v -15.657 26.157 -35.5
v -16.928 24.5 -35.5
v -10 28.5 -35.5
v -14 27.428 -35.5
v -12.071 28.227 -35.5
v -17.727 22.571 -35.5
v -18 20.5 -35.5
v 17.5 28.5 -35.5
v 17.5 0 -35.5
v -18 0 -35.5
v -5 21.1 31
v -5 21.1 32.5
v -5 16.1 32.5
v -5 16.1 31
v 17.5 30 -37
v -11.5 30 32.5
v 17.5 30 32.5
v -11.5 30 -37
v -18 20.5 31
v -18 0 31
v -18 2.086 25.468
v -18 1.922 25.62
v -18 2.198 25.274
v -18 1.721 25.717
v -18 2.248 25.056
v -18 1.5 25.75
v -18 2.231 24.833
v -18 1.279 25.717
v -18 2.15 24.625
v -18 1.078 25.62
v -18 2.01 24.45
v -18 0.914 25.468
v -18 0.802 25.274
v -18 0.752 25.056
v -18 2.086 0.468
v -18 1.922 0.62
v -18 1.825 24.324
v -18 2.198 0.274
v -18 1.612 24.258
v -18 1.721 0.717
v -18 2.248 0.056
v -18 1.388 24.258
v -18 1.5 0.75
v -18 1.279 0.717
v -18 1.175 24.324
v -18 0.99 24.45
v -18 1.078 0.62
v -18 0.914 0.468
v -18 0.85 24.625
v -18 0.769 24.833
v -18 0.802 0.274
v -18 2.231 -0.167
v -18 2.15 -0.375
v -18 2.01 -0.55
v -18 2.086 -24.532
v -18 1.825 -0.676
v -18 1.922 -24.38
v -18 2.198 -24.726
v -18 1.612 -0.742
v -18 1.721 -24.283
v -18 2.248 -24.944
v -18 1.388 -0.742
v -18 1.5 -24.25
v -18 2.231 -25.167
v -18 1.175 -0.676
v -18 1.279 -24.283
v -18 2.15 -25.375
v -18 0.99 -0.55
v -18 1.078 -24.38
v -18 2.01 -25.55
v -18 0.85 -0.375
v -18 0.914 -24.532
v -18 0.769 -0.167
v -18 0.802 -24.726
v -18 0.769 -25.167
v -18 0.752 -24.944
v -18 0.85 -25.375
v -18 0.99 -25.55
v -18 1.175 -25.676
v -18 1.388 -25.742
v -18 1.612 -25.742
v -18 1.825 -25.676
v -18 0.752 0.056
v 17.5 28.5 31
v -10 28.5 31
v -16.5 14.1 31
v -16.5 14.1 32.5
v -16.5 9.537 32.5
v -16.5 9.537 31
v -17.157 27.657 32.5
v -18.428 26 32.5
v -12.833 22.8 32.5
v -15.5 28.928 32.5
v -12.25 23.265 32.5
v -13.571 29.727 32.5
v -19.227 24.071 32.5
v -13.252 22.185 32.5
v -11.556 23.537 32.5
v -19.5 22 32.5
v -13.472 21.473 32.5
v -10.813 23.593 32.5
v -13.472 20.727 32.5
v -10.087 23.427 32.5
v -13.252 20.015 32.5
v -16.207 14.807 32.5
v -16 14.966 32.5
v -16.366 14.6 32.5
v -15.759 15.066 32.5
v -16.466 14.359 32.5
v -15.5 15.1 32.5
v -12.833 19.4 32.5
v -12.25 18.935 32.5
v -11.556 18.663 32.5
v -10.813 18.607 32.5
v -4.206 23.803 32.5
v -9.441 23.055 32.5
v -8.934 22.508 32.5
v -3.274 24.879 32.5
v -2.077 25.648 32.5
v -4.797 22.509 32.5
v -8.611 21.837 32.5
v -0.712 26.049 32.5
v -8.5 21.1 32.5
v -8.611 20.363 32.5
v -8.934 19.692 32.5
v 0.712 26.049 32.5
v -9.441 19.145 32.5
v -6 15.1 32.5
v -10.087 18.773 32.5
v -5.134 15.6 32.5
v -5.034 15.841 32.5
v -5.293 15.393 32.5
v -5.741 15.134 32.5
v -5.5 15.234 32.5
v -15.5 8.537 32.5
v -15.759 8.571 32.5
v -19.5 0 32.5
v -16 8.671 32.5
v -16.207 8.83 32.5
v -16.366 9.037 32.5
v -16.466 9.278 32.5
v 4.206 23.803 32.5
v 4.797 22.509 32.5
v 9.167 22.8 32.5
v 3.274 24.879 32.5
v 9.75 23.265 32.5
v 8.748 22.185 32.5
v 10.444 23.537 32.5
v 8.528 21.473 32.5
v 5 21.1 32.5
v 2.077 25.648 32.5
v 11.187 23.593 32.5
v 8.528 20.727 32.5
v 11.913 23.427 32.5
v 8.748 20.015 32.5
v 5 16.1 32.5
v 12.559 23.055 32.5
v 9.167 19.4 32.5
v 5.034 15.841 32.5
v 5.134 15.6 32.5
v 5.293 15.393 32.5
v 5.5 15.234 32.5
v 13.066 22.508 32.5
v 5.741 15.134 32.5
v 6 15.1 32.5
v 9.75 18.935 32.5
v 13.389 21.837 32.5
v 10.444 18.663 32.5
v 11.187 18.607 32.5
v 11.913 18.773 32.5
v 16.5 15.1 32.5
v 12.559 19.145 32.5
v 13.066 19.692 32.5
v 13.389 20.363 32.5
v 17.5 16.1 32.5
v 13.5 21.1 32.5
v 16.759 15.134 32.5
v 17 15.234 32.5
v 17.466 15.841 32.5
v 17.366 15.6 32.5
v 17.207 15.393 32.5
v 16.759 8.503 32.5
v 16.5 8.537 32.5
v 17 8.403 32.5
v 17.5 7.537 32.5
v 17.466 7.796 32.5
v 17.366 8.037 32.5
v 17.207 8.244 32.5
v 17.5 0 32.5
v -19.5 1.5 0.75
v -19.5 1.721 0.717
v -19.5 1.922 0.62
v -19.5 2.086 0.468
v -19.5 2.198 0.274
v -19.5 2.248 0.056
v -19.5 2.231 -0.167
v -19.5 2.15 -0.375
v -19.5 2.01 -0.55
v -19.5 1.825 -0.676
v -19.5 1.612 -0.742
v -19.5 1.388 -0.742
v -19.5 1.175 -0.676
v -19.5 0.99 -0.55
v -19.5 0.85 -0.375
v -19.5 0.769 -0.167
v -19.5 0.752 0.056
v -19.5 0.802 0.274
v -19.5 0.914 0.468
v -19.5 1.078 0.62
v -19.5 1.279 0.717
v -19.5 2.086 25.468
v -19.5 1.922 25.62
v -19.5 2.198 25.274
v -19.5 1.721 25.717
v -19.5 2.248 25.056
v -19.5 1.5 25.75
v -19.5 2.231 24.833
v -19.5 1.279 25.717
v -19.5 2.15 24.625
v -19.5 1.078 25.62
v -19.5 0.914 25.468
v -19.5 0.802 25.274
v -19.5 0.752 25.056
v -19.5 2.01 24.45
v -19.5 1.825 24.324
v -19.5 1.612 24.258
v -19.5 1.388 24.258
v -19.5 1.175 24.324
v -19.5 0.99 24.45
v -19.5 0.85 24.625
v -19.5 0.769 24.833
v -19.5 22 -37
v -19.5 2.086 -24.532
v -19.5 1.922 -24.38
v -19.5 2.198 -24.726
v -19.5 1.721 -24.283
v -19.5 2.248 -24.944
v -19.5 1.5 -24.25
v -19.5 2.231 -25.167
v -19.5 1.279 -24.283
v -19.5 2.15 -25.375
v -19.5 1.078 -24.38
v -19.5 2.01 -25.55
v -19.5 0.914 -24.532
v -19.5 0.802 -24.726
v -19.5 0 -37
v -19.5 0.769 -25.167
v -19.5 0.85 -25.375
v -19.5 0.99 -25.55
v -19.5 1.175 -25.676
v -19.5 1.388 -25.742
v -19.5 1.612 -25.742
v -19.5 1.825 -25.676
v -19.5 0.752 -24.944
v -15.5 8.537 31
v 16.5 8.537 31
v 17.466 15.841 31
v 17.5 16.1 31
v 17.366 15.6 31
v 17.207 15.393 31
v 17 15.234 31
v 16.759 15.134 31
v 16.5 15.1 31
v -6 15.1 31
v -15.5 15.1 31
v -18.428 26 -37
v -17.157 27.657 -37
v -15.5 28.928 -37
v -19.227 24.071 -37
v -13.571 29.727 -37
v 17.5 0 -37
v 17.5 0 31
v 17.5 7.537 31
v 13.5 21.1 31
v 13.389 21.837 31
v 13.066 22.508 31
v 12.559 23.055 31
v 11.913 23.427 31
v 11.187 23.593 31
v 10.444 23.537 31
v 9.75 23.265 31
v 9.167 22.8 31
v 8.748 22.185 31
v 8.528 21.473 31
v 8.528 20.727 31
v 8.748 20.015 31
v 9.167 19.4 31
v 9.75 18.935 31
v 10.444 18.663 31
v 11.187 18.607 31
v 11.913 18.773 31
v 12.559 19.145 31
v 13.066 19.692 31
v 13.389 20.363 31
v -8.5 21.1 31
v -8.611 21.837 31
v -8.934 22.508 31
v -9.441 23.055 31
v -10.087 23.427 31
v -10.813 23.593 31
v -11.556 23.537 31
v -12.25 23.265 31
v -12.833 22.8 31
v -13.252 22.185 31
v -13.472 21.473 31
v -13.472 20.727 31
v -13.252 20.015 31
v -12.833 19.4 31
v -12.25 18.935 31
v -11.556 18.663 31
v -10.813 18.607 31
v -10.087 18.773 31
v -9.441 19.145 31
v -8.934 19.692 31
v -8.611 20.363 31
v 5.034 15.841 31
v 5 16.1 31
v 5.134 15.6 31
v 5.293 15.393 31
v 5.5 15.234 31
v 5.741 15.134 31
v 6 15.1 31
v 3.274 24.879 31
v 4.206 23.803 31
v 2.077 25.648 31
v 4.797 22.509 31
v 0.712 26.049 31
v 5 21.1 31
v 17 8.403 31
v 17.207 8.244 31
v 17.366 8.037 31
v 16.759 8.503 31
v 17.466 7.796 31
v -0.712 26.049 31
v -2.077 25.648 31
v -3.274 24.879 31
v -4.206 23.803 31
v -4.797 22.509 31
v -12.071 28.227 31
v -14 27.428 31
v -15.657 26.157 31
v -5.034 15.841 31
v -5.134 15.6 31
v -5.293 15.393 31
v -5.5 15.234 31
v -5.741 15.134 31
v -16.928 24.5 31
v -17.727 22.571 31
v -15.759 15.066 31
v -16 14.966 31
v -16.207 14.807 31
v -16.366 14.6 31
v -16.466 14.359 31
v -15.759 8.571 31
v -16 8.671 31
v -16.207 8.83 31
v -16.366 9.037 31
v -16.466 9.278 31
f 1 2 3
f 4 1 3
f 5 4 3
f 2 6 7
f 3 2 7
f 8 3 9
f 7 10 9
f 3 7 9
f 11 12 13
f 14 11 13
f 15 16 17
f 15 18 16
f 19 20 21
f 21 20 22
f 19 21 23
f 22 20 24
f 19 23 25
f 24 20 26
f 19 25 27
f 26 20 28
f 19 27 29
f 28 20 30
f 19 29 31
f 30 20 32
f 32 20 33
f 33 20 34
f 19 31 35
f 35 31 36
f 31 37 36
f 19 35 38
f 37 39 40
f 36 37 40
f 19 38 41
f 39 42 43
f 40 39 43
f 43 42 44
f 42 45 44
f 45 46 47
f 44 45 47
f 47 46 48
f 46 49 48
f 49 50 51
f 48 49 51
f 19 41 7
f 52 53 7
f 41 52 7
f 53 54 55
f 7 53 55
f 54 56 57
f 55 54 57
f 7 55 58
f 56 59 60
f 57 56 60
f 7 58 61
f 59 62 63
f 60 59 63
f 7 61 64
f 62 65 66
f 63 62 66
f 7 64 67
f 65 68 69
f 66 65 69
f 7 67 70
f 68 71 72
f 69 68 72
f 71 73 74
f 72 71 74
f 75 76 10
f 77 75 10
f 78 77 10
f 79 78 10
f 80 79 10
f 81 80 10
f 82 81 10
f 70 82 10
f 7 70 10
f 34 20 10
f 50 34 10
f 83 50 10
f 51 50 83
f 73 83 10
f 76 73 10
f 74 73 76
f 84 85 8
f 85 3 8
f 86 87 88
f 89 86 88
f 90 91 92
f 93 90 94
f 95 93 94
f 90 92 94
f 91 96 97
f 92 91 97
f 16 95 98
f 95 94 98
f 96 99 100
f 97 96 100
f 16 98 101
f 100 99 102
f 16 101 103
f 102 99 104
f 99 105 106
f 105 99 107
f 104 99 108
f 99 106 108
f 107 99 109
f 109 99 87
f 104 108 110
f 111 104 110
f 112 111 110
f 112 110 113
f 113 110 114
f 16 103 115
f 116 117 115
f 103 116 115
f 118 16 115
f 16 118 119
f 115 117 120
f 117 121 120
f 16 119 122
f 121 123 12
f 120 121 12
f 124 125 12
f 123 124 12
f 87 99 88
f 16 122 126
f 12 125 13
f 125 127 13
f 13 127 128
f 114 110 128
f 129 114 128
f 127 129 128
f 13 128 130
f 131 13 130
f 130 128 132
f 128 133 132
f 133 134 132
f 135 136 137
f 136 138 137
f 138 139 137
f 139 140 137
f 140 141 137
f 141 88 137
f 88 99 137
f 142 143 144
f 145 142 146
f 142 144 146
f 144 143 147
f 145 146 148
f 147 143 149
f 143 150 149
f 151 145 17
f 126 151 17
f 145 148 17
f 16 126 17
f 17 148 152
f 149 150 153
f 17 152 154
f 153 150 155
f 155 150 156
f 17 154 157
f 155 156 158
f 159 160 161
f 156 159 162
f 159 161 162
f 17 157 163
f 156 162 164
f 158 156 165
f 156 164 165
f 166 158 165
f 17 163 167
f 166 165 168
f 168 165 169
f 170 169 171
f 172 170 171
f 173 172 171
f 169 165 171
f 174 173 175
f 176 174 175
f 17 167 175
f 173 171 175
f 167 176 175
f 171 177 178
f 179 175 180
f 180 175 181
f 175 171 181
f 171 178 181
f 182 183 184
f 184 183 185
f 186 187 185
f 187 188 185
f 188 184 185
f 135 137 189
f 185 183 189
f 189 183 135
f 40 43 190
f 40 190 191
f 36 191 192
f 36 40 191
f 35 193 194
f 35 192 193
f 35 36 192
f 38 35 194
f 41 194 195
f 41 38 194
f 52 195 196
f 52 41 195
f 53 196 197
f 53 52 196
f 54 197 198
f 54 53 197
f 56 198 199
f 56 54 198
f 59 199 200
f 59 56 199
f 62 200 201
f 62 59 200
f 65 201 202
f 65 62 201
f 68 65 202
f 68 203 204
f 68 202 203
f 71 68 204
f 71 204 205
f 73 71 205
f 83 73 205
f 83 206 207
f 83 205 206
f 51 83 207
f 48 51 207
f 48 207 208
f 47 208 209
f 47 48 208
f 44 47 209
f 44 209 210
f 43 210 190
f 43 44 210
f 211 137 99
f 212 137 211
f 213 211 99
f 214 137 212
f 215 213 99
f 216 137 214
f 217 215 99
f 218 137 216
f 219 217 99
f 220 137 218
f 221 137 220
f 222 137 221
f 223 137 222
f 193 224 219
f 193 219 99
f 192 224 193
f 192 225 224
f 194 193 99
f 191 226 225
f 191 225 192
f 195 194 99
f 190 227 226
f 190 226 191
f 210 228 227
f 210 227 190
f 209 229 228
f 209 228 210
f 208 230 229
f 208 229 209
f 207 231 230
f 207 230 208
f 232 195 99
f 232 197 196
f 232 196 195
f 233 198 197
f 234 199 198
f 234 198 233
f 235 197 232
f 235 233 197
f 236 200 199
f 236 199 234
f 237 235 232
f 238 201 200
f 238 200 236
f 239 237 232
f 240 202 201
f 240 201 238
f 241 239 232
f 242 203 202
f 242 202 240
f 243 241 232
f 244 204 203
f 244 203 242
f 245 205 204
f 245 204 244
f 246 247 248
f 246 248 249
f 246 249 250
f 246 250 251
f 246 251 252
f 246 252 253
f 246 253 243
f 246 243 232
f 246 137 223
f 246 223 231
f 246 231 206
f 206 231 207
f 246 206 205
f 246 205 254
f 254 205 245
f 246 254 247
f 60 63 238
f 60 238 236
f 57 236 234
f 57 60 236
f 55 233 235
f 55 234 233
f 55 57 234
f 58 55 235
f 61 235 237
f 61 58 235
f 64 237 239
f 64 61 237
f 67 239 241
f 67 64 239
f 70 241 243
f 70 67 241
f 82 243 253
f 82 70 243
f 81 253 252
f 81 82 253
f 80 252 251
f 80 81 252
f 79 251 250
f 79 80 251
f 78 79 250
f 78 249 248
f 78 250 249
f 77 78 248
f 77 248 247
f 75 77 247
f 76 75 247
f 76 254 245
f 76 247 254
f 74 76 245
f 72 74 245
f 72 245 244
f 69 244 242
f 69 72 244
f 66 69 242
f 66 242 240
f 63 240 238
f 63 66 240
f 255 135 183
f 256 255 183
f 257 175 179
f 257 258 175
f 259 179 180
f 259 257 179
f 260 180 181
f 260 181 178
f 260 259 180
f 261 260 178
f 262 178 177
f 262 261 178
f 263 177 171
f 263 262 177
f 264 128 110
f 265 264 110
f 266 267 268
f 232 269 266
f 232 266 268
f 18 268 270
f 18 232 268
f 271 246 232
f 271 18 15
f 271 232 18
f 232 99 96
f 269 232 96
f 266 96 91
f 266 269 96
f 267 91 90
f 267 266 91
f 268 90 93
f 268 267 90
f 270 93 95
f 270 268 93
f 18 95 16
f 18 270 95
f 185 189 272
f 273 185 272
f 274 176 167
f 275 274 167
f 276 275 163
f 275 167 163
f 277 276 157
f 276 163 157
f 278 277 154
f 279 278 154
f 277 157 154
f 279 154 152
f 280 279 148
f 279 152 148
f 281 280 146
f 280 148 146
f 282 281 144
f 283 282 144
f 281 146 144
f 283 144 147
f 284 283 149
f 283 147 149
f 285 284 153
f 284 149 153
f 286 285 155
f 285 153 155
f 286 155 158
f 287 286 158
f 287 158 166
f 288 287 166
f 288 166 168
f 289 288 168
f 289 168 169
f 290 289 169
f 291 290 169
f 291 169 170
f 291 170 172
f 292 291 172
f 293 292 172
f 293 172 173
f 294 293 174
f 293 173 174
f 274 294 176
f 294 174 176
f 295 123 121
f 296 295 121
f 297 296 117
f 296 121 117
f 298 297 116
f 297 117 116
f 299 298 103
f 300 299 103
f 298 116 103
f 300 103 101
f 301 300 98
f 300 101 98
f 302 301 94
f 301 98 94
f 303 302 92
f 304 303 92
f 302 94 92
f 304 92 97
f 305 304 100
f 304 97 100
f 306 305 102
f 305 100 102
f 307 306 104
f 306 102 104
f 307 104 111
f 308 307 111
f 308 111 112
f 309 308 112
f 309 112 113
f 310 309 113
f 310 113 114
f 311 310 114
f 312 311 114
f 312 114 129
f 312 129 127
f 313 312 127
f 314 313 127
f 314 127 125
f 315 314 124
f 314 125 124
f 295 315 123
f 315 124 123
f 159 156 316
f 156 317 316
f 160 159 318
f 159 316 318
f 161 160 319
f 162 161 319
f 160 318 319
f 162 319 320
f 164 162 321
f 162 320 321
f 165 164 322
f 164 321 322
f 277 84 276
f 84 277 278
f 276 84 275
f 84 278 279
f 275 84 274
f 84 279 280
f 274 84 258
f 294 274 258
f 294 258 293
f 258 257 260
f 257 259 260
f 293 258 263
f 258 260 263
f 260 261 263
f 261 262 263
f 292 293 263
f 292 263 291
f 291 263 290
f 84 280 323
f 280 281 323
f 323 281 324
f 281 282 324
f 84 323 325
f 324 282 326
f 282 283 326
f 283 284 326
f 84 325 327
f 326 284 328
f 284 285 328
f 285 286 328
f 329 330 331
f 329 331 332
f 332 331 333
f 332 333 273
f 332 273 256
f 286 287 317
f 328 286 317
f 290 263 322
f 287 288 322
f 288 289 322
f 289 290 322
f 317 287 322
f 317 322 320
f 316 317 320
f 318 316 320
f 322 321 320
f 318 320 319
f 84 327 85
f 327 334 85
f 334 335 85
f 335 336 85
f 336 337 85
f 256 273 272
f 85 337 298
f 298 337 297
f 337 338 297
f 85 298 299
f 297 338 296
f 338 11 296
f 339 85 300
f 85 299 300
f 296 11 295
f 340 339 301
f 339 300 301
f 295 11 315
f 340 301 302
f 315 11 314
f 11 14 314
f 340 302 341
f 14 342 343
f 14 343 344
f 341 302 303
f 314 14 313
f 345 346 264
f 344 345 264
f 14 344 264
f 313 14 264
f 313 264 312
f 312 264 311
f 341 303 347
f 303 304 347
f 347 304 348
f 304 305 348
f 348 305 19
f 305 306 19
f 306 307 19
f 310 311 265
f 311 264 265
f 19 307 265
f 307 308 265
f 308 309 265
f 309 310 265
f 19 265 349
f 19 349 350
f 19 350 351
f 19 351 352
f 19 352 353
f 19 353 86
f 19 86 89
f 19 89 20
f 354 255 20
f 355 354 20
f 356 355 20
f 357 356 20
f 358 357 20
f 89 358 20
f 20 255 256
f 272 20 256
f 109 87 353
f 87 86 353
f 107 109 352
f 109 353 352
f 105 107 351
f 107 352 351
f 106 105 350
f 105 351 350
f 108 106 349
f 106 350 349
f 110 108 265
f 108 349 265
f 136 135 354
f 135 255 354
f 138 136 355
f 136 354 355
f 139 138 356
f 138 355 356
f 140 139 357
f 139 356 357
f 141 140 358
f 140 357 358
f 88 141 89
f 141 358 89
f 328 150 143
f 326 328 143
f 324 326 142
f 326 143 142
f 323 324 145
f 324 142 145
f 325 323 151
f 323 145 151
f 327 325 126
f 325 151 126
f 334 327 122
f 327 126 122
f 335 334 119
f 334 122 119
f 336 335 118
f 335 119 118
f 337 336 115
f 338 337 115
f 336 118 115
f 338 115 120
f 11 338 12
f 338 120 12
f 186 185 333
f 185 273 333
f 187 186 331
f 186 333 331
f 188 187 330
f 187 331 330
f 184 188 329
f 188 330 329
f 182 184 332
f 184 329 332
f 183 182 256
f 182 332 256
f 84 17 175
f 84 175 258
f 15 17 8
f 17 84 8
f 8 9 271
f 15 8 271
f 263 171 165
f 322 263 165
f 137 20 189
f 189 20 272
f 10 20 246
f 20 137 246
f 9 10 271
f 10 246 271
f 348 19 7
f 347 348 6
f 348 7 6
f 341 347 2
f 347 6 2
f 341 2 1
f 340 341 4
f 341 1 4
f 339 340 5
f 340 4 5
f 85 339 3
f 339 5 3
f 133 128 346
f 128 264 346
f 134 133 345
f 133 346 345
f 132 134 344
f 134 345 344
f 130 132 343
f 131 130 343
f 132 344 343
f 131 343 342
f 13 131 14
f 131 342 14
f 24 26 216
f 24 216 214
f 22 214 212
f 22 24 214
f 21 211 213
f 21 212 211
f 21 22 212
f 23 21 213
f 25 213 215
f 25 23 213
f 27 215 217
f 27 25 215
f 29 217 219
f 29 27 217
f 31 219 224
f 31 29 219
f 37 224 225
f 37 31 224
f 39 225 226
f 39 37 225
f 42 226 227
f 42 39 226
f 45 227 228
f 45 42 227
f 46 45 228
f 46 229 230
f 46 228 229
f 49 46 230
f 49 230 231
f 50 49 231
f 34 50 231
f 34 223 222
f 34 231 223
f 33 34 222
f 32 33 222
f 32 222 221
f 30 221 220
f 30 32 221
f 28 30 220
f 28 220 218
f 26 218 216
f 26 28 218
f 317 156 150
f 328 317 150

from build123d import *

# Parameters (mm, degrees)
BOSS_EXTRUDE1_DEPTH     = 15
CUT_EXTRUDE1_DEPTH      = 45.432533126
CUT_EXTRUDE1_DEPTH_BACK = 45.432533126
SKETCH3_W               = 35.5
SKETCH3_H               = 1.5
BOSS_EXTRUDE2_DEPTH     = 15
BOSS_EXTRUDE3_DEPTH     = 13.5
SKETCH5_W               = 37
SKETCH5_H               = 69.5
BOSS_EXTRUDE4_DEPTH     = 1.5
FILLET1_R               = 8
SKETCH6_R               = 2.5
CUT_EXTRUDE2_DEPTH      = 1.5
FILLET2_R               = 1
CUT_EXTRUDE3_DEPTH      = 61.3158354
CUT_EXTRUDE3_DEPTH_BACK = 61.3158354
SKETCH7_R               = 0.75


with BuildPart() as part:
    # Sketch1 → Boss-Extrude1 (new body)
    with BuildSketch(Plane(origin=(0, 0, 0), x_dir=(1, 0, 0), z_dir=(0, 1, 0))):
        Polygon((17.5, 35.5), (-18, 35.5), (-18, -35.5), (17.5, -35.5), (17.5, -37), (-19.5, -37), (-19.5, 37), (17.5, 37), align=None)
    extrude(amount=BOSS_EXTRUDE1_DEPTH)

    # Sketch2 → Cut-Extrude1 (cut, two sides: drawn at the far end of the back side and taken through both)
    with BuildSketch(Plane(origin=(0, 15, 0), x_dir=(1, 0, 0), z_dir=(0, 1, 0)).offset(-CUT_EXTRUDE1_DEPTH_BACK)):
        Polygon((17.5, -35.5), (17.5, -37), (28.422753275, -37), (28.422753275, -32.5), (-18, -32.5), (-18, -35.5), align=None)
        Polygon((-19.5, -32.5), (-19.5, -37), (17.5, -37), (17.5, -35.5), (-18, -35.5), (-18, -32.5), align=None)
    extrude(amount=CUT_EXTRUDE1_DEPTH + CUT_EXTRUDE1_DEPTH_BACK, mode=Mode.SUBTRACT)

    # Sketch3 → Boss-Extrude2 (add)
    with BuildSketch(Plane(origin=(0, 15, 0), x_dir=(1, 0, 0), z_dir=(0, 1, 0))):
        with Locations((-0.25, -31.75)):
            Rectangle(SKETCH3_W, SKETCH3_H)
    extrude(amount=-BOSS_EXTRUDE2_DEPTH)

    # Sketch4 → Boss-Extrude3 (add)
    with BuildSketch(Plane(origin=(0, 15, 0), x_dir=(1, 0, 0), z_dir=(0, 1, 0))):
        Polygon((-19.5, -32.5), (17.5, -32.5), (17.5, -31), (-18, -31), (-18, 35.5), (17.5, 35.5), (17.5, 37), (-19.5, 37), align=None)
    extrude(amount=BOSS_EXTRUDE3_DEPTH)

    # Sketch5 → Boss-Extrude4 (add)
    with BuildSketch(Plane(origin=(0, 28.5, 0), x_dir=(1, 0, 0), z_dir=(0, 1, 0))):
        with Locations((-1, 2.25)):
            Rectangle(SKETCH5_W, SKETCH5_H)
    extrude(amount=BOSS_EXTRUDE4_DEPTH)

    # Fillet1
    fillet1_edges = [part.edges().sort_by_distance(p)[0] for p in [
        (-18, 28.5, -2.25),
        (-19.5, 30, -2.25),
    ]]
    fillet(fillet1_edges, radius=FILLET1_R)

    # Sketch6 → Cut-Extrude2 (cut)
    with BuildSketch(Plane.XY.offset(32.5)):
        with BuildLine():
            Line((-5, 15.1), (-16.5, 15.1))
            Line((-16.5, 15.1), (-16.5, 8.53719171))
            Line((-16.5, 8.53719171), (17.5, 8.53719171))
            Line((17.5, 8.53719171), (17.5, 15.1))
            Line((17.5, 15.1), (5, 15.1))
            Line((5, 15.1), (5, 21.1))
            ThreePointArc((5, 21.1), (0, 26.1), (-5, 21.1))
            Line((-5, 21.1), (-5, 15.1))
        make_face()
        with Locations((-11, 21.1)):
            Circle(SKETCH6_R)
        with Locations((11, 21.1)):
            Circle(SKETCH6_R)
    extrude(amount=-CUT_EXTRUDE2_DEPTH, mode=Mode.SUBTRACT)

    # Fillet2
    fillet2_edges = [part.edges().sort_by_distance(p)[0] for p in [
        (5, 15.1, 31.75),
        (17.5, 15.1, 31.75),
        (17.5, 8.53719171, 31.75),
        (-16.5, 8.53719171, 31.75),
        (-16.5, 15.1, 31.75),
        (-5, 15.1, 31.75),
    ]]
    fillet(fillet2_edges, radius=FILLET2_R)

    # Sketch7 → Cut-Extrude3 (cut, two sides: drawn at the far end of the back side and taken through both)
    with BuildSketch(Plane.ZY.offset(19.5).offset(-CUT_EXTRUDE3_DEPTH_BACK)):
        with Locations((25, 1.5)):
            Circle(SKETCH7_R)
        with Locations((0, 1.5)):
            Circle(SKETCH7_R)
        with Locations((-25, 1.5)):
            Circle(SKETCH7_R)
    extrude(amount=CUT_EXTRUDE3_DEPTH + CUT_EXTRUDE3_DEPTH_BACK, mode=Mode.SUBTRACT)


solid = part.part
